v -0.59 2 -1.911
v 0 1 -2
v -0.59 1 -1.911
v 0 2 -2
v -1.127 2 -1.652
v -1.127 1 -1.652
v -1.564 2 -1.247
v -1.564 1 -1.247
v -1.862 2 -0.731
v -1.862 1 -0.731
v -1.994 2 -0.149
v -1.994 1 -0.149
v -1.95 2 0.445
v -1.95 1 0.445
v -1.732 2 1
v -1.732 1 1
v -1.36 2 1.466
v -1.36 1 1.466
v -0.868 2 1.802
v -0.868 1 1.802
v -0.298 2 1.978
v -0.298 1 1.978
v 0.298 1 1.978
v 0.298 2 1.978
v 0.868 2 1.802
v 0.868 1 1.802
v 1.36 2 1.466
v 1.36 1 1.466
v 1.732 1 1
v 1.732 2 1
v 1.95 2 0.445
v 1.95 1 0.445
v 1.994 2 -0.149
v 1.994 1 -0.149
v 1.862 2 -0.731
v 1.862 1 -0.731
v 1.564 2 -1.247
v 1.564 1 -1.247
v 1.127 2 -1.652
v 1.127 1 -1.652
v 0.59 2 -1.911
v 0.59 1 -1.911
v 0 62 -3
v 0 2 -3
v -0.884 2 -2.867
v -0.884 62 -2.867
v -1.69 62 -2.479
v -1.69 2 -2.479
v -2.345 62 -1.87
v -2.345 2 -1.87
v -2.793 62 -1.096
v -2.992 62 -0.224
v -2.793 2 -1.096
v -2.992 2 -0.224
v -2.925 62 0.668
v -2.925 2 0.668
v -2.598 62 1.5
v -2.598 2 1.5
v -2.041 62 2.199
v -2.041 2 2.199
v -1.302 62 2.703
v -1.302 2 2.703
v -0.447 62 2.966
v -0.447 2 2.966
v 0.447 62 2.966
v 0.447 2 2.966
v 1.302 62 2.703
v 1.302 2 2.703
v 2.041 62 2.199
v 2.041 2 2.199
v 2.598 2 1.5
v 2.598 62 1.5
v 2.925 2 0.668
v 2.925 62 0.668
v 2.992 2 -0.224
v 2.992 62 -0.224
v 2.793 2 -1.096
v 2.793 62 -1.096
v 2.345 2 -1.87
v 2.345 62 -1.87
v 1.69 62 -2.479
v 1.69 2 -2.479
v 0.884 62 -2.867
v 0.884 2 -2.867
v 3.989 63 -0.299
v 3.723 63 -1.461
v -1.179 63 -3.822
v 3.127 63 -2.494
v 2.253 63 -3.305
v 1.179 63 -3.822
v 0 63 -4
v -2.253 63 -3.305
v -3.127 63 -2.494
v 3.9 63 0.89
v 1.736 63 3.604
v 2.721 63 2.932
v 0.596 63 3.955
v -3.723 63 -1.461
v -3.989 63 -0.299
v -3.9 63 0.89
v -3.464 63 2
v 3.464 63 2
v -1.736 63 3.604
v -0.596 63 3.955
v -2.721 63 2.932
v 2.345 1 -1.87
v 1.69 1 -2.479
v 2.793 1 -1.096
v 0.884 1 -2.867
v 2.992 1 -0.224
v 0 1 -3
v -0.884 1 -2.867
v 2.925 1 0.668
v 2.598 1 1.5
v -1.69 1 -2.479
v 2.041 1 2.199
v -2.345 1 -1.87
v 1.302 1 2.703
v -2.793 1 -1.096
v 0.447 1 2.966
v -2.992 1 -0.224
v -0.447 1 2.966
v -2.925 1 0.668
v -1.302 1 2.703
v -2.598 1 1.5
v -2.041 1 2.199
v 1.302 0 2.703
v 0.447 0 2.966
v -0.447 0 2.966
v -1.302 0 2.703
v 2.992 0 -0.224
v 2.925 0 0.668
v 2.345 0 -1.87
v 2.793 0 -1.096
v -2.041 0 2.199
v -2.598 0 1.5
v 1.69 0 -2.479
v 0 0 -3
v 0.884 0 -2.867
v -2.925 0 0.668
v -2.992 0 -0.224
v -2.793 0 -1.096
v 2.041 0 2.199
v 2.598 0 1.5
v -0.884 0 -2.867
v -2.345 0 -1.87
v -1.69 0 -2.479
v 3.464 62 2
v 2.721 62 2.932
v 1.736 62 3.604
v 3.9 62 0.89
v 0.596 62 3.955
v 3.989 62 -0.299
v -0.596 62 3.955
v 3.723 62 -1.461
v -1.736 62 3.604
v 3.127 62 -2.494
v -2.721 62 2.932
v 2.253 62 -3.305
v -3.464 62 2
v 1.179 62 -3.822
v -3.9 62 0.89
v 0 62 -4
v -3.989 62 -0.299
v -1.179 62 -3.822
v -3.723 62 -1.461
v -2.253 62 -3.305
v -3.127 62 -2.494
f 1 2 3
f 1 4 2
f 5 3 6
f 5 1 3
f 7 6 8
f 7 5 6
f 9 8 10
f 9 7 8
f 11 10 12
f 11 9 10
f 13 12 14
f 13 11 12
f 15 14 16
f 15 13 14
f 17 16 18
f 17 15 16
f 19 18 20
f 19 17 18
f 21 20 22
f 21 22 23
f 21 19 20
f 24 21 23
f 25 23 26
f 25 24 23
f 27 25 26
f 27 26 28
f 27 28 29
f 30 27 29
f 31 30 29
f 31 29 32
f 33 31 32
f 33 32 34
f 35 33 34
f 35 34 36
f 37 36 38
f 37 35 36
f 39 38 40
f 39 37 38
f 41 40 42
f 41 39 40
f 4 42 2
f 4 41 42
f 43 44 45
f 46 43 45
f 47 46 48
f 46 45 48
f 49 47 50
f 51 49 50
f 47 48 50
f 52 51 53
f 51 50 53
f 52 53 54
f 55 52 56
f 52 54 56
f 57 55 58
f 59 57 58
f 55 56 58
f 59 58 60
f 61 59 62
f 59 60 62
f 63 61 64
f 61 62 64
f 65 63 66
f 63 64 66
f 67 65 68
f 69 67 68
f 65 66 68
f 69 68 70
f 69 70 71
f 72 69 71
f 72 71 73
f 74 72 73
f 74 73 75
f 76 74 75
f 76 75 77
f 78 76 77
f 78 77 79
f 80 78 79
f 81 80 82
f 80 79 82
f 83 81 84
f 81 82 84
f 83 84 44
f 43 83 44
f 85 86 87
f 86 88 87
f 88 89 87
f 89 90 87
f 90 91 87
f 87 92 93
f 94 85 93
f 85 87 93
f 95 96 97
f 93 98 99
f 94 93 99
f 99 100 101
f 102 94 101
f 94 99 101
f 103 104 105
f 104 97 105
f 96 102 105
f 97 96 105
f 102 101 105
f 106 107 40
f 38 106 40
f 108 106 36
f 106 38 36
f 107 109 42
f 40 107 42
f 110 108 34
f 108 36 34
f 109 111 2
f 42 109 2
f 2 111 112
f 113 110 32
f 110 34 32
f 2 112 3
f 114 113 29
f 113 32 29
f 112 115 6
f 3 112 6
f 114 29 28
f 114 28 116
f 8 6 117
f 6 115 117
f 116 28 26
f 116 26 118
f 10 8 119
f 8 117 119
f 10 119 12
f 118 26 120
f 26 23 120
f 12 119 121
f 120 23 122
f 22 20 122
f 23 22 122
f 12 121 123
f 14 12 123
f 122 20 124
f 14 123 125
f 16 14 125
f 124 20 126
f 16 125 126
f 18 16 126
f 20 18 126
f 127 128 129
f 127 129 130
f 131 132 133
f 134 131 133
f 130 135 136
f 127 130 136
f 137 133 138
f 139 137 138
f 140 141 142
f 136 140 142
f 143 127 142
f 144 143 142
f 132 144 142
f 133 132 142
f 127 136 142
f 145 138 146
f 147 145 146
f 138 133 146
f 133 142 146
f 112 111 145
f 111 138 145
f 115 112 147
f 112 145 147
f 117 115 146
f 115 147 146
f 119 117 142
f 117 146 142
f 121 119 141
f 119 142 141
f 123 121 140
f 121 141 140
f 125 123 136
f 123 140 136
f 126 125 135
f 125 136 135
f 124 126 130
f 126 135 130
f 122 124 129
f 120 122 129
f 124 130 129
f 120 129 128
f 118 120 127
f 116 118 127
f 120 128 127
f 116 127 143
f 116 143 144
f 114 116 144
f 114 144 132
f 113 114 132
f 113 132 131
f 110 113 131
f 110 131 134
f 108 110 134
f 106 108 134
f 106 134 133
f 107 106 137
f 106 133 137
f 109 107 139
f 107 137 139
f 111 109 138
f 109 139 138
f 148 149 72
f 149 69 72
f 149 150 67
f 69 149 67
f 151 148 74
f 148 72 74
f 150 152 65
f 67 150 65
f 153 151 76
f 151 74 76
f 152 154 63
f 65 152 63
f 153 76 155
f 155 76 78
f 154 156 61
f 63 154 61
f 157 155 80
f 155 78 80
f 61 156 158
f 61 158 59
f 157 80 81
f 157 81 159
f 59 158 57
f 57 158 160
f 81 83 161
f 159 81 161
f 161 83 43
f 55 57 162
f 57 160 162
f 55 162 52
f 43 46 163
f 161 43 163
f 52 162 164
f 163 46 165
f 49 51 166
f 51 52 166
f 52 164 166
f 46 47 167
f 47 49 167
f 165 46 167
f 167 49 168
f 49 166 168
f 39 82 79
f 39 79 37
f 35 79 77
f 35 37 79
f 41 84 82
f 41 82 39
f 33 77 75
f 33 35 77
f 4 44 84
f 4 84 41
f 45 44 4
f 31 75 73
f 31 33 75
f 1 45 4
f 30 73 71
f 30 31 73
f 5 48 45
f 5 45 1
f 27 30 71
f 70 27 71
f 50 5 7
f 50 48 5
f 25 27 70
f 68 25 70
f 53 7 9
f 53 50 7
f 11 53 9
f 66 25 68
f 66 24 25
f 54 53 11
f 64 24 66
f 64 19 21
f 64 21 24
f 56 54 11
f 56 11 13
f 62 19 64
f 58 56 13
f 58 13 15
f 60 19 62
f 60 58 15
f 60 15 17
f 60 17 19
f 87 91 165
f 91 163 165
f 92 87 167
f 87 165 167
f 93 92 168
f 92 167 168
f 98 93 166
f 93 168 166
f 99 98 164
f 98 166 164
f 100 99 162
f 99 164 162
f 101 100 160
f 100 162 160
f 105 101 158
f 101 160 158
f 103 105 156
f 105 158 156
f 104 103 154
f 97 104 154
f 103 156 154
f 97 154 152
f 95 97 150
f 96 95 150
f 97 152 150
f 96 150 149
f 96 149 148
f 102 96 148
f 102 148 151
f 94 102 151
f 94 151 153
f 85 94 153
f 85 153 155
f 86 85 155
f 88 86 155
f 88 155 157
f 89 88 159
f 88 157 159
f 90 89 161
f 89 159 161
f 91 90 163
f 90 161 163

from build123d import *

# Parameters (mm, degrees)
SKETCH_4_W = 1
SKETCH_4_H = 1


with BuildPart() as part:
    # 草图1 → 旋转1 (revolve)
    with BuildSketch(Plane(origin=(0, 0, 0), x_dir=(0, 0, -1), z_dir=(1, 0, 0))):
        Polygon((0, 63), (4, 63), (4, 62), (3, 62), (3, 0), (0, 0), align=None)
    revolve(axis=Axis((0, 0, 0), (0, 1, 0)))

    # 草图4 → 切除-旋转1 (revolve, cut)
    with BuildSketch(Plane.XY, mode=Mode.PRIVATE) as cut_revolve_1_sk:
        with Locations((2.5, 1.5)):
            Rectangle(SKETCH_4_W, SKETCH_4_H)
    revolve(cut_revolve_1_sk.sketch.rotate(Axis((0, 0, 0), (0, 1, 0)), 90), axis=Axis((0, 0, 0), (0, 1, 0)), mode=Mode.SUBTRACT)


solid = part.part
